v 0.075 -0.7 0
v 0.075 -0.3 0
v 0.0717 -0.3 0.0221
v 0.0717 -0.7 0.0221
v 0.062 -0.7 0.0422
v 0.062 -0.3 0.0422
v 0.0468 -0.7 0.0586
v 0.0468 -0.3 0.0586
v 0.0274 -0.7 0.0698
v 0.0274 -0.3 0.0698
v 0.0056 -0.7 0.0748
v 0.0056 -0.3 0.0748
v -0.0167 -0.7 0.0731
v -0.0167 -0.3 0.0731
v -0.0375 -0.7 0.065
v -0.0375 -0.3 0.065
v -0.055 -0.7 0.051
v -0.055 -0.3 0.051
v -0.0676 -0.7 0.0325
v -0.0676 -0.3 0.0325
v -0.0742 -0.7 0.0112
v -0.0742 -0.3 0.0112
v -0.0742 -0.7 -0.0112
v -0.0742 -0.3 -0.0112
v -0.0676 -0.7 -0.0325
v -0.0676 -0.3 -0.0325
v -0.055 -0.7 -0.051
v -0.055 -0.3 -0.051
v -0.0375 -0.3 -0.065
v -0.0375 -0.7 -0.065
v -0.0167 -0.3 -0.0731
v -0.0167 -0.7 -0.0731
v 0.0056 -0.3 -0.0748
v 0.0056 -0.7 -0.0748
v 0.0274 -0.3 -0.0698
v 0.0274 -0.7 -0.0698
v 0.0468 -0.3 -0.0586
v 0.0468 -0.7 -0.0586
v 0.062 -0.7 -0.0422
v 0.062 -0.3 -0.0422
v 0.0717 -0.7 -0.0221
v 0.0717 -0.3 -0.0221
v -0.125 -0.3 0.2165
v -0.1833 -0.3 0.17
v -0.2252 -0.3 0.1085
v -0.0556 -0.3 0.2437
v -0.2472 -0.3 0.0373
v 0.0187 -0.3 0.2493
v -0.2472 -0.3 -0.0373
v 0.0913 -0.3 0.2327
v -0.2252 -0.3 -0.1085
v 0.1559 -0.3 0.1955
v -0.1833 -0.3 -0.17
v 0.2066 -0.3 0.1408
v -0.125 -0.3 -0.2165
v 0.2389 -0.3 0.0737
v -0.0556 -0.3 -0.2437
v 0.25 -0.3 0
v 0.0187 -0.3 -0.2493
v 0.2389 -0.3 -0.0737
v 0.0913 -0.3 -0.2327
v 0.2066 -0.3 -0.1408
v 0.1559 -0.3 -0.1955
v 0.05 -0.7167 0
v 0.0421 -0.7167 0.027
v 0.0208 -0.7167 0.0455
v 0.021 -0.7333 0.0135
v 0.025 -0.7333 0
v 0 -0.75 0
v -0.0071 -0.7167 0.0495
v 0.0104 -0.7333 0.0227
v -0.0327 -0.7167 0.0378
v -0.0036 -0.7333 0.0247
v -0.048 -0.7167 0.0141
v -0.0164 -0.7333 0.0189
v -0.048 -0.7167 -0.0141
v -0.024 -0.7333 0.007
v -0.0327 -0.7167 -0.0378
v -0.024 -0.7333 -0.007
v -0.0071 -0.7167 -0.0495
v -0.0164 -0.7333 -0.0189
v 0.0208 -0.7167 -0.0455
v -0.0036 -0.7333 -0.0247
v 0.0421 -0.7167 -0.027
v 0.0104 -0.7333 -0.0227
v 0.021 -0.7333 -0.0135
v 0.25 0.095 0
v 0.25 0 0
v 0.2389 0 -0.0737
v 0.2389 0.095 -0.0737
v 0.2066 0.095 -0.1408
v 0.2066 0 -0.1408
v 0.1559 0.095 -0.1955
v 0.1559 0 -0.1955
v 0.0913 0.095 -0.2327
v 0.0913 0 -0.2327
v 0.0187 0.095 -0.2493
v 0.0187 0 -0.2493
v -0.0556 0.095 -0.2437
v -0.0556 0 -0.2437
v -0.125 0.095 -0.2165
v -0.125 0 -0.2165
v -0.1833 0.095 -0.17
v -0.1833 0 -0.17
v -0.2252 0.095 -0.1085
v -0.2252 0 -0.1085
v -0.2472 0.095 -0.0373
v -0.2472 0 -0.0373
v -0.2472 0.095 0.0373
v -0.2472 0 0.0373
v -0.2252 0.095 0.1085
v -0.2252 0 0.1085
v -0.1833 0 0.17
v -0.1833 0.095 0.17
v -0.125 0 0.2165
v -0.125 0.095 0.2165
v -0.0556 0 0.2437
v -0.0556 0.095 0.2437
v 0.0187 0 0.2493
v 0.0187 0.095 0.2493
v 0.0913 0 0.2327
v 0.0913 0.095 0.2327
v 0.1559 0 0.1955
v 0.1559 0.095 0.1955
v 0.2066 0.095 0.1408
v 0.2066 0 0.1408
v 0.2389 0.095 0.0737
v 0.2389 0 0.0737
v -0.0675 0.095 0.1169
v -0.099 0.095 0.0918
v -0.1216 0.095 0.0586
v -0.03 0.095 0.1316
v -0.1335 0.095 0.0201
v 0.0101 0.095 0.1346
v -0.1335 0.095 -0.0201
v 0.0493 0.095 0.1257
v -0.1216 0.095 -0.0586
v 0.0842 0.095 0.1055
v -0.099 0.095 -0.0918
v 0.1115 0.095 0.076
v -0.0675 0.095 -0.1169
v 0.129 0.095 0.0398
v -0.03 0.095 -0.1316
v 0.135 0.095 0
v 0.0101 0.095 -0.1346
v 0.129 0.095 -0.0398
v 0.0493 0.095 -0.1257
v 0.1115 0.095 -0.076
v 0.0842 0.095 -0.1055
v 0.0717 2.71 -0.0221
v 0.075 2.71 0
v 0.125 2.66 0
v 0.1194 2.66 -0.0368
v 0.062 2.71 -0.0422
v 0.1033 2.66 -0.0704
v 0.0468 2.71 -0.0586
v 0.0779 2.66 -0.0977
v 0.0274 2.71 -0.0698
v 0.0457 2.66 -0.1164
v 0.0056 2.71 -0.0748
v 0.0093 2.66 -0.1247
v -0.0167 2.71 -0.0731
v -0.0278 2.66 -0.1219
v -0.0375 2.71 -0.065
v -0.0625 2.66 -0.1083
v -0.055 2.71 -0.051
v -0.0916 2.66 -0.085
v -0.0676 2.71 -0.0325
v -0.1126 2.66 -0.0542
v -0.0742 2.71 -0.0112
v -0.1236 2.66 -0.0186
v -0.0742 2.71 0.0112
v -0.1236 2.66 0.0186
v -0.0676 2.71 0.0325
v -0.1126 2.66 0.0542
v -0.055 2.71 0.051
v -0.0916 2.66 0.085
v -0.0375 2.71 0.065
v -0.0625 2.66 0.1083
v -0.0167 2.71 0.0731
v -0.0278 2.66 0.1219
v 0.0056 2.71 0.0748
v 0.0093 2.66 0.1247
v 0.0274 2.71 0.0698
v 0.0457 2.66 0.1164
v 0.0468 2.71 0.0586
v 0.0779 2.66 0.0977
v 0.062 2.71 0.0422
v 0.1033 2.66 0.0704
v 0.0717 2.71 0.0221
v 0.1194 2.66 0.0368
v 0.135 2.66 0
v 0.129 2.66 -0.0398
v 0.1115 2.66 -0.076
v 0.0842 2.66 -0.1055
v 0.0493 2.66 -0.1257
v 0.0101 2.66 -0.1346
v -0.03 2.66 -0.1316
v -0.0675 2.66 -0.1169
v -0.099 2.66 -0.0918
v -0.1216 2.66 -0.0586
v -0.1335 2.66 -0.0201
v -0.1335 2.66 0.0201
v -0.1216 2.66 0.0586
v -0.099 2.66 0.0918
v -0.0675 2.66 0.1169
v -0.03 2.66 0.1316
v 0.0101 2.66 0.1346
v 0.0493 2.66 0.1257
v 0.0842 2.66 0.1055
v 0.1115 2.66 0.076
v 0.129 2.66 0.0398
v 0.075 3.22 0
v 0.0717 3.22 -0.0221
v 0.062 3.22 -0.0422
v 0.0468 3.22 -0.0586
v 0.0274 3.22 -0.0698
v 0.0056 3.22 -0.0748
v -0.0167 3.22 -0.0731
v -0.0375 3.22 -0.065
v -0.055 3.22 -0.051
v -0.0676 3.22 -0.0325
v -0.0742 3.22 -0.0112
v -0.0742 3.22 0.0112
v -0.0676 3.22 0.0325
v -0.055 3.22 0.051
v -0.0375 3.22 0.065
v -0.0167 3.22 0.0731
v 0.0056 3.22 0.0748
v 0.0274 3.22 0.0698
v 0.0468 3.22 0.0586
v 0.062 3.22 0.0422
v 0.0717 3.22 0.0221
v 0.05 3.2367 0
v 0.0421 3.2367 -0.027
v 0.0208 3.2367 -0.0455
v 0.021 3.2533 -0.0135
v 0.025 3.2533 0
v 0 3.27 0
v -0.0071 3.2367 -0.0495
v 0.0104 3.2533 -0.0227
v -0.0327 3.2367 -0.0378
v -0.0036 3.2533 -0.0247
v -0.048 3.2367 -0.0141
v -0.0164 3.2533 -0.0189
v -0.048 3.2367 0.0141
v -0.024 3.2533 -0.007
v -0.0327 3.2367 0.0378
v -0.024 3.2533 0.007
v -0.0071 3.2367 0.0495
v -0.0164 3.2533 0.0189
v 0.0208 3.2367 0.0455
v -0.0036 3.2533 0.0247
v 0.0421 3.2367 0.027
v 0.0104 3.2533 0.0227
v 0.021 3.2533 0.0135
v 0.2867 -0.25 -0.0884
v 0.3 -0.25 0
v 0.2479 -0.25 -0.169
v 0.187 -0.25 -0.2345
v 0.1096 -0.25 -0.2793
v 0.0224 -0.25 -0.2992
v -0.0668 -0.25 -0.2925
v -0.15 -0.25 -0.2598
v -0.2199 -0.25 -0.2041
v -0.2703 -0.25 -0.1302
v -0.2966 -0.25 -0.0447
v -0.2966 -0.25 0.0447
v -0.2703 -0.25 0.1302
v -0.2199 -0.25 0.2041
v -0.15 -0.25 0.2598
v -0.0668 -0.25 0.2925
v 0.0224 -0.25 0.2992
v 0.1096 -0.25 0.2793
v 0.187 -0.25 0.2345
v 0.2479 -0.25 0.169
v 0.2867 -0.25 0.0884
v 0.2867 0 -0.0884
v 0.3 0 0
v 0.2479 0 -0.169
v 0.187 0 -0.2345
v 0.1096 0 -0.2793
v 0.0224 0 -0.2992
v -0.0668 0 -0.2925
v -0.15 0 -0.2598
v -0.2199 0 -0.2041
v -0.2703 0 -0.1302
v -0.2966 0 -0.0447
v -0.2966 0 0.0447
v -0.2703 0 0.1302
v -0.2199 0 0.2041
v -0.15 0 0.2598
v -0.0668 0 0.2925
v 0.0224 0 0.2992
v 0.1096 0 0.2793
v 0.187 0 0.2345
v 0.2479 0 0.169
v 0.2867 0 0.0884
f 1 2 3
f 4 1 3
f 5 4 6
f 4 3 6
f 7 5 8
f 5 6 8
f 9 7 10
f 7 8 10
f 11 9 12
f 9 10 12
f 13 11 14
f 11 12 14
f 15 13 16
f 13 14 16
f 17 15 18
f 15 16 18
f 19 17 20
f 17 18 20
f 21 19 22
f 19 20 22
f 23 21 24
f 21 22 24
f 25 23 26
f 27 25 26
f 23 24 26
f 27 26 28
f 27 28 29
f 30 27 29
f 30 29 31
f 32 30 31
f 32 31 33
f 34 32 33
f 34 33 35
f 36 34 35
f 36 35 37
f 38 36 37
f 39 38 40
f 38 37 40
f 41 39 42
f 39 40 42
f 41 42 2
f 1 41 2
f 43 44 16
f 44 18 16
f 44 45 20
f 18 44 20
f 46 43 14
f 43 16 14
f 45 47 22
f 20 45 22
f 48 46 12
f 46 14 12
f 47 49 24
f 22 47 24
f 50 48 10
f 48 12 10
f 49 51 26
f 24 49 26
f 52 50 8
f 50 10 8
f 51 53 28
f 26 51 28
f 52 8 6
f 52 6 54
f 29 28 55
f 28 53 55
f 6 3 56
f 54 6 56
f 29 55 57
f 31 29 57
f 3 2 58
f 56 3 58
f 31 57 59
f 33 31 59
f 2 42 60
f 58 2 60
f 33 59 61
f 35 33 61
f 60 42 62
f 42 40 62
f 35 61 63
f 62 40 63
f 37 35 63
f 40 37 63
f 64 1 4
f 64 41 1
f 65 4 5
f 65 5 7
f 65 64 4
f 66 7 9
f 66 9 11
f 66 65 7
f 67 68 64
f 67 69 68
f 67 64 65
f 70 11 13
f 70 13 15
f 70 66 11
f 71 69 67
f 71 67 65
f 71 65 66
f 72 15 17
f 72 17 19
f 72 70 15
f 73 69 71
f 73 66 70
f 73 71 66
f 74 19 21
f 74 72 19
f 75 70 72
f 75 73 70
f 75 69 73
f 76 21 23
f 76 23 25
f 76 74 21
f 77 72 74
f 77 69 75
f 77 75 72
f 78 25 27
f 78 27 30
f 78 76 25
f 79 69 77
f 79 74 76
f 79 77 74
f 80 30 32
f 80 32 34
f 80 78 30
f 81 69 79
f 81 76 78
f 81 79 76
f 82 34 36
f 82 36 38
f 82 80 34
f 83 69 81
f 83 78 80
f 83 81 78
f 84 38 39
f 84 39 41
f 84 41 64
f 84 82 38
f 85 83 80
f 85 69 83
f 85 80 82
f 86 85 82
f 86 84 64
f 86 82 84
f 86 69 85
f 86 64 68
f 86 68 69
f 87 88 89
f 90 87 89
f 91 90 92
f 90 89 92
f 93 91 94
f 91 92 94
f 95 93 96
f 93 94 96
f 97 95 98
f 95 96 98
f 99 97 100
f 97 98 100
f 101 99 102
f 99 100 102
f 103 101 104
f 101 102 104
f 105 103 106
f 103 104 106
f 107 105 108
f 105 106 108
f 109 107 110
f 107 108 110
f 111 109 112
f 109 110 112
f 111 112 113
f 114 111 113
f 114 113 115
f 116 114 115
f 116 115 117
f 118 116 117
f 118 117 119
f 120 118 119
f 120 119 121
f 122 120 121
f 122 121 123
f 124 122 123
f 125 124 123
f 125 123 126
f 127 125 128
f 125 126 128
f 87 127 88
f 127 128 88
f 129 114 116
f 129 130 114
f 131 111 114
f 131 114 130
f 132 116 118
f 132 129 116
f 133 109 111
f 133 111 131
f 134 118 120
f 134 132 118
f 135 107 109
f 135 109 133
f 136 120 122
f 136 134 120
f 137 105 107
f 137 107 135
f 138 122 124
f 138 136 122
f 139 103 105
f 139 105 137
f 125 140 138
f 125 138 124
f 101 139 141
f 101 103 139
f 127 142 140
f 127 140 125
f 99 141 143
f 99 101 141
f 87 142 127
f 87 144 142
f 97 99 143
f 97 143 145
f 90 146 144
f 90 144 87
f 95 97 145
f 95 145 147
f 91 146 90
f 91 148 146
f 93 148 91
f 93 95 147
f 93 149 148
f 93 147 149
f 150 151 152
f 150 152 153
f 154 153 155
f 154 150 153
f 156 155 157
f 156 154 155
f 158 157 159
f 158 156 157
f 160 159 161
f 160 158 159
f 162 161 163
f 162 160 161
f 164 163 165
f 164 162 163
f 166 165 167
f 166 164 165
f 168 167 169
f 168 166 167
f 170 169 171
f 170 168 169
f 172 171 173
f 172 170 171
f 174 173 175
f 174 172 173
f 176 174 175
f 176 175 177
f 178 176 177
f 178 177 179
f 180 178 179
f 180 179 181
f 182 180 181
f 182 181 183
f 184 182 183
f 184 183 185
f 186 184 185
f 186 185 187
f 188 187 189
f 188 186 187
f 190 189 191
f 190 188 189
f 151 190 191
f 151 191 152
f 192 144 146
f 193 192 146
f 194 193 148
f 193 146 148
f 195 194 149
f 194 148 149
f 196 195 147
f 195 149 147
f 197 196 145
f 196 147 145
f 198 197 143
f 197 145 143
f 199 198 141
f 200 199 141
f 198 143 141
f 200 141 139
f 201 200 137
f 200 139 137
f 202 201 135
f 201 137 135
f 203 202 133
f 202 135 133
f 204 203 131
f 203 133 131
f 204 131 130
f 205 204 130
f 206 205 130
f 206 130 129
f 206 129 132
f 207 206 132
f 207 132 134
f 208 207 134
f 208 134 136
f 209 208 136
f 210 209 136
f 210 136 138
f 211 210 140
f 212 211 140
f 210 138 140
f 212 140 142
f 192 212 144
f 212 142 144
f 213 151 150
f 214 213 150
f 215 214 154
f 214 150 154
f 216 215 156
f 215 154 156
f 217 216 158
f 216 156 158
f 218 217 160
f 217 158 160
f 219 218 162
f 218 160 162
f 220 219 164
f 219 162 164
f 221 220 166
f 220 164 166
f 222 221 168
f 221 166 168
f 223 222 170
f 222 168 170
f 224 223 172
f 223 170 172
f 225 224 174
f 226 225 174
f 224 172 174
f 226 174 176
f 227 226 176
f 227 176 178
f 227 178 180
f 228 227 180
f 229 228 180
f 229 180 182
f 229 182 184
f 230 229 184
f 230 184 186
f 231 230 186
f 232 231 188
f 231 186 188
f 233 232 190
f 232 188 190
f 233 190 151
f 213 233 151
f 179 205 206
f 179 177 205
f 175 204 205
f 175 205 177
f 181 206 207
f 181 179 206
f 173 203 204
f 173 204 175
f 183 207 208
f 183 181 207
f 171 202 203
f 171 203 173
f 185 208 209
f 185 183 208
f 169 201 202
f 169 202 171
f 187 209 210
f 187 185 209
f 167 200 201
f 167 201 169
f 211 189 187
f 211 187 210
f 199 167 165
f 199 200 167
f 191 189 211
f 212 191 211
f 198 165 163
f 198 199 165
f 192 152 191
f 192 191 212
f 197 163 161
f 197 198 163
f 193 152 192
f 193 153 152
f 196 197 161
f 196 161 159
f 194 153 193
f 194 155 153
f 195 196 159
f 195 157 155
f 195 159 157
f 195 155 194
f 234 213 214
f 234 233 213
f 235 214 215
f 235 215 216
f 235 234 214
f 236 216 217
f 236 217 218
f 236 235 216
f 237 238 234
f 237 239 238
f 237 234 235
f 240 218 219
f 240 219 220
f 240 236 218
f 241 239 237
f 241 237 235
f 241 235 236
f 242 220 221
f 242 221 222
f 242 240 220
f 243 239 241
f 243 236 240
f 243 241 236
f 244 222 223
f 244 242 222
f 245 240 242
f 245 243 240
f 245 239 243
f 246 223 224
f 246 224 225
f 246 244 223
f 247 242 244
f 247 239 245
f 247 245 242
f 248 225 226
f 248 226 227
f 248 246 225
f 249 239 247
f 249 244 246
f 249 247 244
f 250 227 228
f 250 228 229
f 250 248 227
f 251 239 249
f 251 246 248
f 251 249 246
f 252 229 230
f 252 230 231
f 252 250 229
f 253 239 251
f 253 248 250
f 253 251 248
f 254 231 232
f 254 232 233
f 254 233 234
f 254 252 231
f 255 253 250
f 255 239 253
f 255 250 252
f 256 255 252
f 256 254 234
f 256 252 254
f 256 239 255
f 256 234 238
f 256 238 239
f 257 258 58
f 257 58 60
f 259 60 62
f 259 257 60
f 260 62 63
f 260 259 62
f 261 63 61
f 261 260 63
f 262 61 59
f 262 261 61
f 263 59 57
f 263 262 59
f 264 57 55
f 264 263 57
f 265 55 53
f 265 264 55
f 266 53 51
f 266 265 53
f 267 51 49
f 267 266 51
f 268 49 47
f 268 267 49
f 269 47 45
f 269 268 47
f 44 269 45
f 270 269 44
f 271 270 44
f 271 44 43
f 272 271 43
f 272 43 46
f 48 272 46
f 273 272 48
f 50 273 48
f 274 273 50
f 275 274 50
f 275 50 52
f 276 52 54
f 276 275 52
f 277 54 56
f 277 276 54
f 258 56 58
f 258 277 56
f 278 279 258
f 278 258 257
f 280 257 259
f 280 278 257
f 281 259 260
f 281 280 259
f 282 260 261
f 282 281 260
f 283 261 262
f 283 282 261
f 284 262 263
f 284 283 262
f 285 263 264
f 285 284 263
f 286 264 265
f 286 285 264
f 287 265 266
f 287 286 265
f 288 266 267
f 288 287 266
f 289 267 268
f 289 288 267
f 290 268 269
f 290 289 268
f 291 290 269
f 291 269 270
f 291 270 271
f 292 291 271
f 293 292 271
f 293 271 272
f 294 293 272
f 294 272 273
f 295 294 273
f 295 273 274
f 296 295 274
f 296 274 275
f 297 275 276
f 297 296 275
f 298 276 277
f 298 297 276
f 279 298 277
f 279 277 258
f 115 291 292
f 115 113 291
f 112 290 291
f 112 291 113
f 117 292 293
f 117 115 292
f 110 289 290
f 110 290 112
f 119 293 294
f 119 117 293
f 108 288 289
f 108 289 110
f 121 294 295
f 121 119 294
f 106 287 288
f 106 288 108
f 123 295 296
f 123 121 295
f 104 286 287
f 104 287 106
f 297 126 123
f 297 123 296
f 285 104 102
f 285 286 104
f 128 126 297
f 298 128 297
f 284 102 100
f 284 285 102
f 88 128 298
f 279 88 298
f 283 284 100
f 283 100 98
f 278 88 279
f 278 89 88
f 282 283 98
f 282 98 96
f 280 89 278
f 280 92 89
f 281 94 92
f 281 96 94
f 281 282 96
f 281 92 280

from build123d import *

# Parameters (mm, degrees)
SKETCH2_R           = 0.3
BOSS_EXTRUDE1_DEPTH = 0.3
SKETCH3_R           = 0.075
BOSS_EXTRUDE2_DEPTH = 0.45
SKETCH4_R           = 0.25
BOSS_EXTRUDE3_DEPTH = 0.095
SKETCH5_R           = 0.135
BOSS_EXTRUDE4_DEPTH = 2.565
SKETCH6_R           = 0.075
BOSS_EXTRUDE5_DEPTH = 0.61
CHAMFER1_SIZE       = 0.05
CHAMFER1_SIZE2      = 0.075
CHAMFER2_SIZE       = 0.05
CHAMFER3_SIZE       = 0.05
CHAMFER4_SIZE       = 0.05
CHAMFER4_SIZE2      = 0.075


with BuildPart() as part:
    # Sketch2 → Boss-Extrude1 (new body)
    with BuildSketch(Plane(origin=(0, 0, 0), x_dir=(1, 0, 0), z_dir=(0, 1, 0))):
        Circle(SKETCH2_R)
    extrude(amount=-BOSS_EXTRUDE1_DEPTH)

    # Sketch3 → Boss-Extrude2 (add)
    with BuildSketch(Plane.XZ.offset(0.3)):
        Circle(SKETCH3_R)
    extrude(amount=BOSS_EXTRUDE2_DEPTH)

    # Sketch4 → Boss-Extrude3 (add)
    with BuildSketch(Plane(origin=(0, 0, 0), x_dir=(1, 0, 0), z_dir=(0, 1, 0))):
        Circle(SKETCH4_R)
    extrude(amount=BOSS_EXTRUDE3_DEPTH)

    # Sketch5 → Boss-Extrude4 (add)
    with BuildSketch(Plane(origin=(0, 0.095, 0), x_dir=(1, 0, 0), z_dir=(0, 1, 0))):
        Circle(SKETCH5_R)
    extrude(amount=BOSS_EXTRUDE4_DEPTH)

    # Sketch6 → Boss-Extrude5 (add)
    with BuildSketch(Plane(origin=(0, 2.66, 0), x_dir=(1, 0, 0), z_dir=(0, 1, 0))):
        Circle(SKETCH6_R)
    extrude(amount=BOSS_EXTRUDE5_DEPTH)

    # Chamfer1
    chamfer1_edges = [part.edges().sort_by_distance(p)[0] for p in [
        (-0.075, -0.75, 0),
    ]]
    chamfer1_side = [part.faces().sort_by_distance(p)[0] for p in [
        (-0.075, -0.525, 0),
    ]]
    chamfer(chamfer1_edges, length=CHAMFER1_SIZE, length2=CHAMFER1_SIZE2, reference=chamfer1_side[0])

    # Chamfer2
    chamfer2_edges = [part.edges().sort_by_distance(p)[0] for p in [
        (-0.3, -0.3, 0),
    ]]
    chamfer(chamfer2_edges, length=CHAMFER2_SIZE)

    # Chamfer3
    chamfer3_edges = [part.edges().sort_by_distance(p)[0] for p in [
        (-0.075, 2.66, 0),
    ]]
    chamfer(chamfer3_edges, length=CHAMFER3_SIZE)

    # Chamfer4
    chamfer4_edges = [part.edges().sort_by_distance(p)[0] for p in [
        (-0.075, 3.27, 0),
    ]]
    chamfer4_side = [part.faces().sort_by_distance(p)[0] for p in [
        (-0.075, 2.99, 0),
    ]]
    chamfer(chamfer4_edges, length=CHAMFER4_SIZE, length2=CHAMFER4_SIZE2, reference=chamfer4_side[0])


solid = part.part
